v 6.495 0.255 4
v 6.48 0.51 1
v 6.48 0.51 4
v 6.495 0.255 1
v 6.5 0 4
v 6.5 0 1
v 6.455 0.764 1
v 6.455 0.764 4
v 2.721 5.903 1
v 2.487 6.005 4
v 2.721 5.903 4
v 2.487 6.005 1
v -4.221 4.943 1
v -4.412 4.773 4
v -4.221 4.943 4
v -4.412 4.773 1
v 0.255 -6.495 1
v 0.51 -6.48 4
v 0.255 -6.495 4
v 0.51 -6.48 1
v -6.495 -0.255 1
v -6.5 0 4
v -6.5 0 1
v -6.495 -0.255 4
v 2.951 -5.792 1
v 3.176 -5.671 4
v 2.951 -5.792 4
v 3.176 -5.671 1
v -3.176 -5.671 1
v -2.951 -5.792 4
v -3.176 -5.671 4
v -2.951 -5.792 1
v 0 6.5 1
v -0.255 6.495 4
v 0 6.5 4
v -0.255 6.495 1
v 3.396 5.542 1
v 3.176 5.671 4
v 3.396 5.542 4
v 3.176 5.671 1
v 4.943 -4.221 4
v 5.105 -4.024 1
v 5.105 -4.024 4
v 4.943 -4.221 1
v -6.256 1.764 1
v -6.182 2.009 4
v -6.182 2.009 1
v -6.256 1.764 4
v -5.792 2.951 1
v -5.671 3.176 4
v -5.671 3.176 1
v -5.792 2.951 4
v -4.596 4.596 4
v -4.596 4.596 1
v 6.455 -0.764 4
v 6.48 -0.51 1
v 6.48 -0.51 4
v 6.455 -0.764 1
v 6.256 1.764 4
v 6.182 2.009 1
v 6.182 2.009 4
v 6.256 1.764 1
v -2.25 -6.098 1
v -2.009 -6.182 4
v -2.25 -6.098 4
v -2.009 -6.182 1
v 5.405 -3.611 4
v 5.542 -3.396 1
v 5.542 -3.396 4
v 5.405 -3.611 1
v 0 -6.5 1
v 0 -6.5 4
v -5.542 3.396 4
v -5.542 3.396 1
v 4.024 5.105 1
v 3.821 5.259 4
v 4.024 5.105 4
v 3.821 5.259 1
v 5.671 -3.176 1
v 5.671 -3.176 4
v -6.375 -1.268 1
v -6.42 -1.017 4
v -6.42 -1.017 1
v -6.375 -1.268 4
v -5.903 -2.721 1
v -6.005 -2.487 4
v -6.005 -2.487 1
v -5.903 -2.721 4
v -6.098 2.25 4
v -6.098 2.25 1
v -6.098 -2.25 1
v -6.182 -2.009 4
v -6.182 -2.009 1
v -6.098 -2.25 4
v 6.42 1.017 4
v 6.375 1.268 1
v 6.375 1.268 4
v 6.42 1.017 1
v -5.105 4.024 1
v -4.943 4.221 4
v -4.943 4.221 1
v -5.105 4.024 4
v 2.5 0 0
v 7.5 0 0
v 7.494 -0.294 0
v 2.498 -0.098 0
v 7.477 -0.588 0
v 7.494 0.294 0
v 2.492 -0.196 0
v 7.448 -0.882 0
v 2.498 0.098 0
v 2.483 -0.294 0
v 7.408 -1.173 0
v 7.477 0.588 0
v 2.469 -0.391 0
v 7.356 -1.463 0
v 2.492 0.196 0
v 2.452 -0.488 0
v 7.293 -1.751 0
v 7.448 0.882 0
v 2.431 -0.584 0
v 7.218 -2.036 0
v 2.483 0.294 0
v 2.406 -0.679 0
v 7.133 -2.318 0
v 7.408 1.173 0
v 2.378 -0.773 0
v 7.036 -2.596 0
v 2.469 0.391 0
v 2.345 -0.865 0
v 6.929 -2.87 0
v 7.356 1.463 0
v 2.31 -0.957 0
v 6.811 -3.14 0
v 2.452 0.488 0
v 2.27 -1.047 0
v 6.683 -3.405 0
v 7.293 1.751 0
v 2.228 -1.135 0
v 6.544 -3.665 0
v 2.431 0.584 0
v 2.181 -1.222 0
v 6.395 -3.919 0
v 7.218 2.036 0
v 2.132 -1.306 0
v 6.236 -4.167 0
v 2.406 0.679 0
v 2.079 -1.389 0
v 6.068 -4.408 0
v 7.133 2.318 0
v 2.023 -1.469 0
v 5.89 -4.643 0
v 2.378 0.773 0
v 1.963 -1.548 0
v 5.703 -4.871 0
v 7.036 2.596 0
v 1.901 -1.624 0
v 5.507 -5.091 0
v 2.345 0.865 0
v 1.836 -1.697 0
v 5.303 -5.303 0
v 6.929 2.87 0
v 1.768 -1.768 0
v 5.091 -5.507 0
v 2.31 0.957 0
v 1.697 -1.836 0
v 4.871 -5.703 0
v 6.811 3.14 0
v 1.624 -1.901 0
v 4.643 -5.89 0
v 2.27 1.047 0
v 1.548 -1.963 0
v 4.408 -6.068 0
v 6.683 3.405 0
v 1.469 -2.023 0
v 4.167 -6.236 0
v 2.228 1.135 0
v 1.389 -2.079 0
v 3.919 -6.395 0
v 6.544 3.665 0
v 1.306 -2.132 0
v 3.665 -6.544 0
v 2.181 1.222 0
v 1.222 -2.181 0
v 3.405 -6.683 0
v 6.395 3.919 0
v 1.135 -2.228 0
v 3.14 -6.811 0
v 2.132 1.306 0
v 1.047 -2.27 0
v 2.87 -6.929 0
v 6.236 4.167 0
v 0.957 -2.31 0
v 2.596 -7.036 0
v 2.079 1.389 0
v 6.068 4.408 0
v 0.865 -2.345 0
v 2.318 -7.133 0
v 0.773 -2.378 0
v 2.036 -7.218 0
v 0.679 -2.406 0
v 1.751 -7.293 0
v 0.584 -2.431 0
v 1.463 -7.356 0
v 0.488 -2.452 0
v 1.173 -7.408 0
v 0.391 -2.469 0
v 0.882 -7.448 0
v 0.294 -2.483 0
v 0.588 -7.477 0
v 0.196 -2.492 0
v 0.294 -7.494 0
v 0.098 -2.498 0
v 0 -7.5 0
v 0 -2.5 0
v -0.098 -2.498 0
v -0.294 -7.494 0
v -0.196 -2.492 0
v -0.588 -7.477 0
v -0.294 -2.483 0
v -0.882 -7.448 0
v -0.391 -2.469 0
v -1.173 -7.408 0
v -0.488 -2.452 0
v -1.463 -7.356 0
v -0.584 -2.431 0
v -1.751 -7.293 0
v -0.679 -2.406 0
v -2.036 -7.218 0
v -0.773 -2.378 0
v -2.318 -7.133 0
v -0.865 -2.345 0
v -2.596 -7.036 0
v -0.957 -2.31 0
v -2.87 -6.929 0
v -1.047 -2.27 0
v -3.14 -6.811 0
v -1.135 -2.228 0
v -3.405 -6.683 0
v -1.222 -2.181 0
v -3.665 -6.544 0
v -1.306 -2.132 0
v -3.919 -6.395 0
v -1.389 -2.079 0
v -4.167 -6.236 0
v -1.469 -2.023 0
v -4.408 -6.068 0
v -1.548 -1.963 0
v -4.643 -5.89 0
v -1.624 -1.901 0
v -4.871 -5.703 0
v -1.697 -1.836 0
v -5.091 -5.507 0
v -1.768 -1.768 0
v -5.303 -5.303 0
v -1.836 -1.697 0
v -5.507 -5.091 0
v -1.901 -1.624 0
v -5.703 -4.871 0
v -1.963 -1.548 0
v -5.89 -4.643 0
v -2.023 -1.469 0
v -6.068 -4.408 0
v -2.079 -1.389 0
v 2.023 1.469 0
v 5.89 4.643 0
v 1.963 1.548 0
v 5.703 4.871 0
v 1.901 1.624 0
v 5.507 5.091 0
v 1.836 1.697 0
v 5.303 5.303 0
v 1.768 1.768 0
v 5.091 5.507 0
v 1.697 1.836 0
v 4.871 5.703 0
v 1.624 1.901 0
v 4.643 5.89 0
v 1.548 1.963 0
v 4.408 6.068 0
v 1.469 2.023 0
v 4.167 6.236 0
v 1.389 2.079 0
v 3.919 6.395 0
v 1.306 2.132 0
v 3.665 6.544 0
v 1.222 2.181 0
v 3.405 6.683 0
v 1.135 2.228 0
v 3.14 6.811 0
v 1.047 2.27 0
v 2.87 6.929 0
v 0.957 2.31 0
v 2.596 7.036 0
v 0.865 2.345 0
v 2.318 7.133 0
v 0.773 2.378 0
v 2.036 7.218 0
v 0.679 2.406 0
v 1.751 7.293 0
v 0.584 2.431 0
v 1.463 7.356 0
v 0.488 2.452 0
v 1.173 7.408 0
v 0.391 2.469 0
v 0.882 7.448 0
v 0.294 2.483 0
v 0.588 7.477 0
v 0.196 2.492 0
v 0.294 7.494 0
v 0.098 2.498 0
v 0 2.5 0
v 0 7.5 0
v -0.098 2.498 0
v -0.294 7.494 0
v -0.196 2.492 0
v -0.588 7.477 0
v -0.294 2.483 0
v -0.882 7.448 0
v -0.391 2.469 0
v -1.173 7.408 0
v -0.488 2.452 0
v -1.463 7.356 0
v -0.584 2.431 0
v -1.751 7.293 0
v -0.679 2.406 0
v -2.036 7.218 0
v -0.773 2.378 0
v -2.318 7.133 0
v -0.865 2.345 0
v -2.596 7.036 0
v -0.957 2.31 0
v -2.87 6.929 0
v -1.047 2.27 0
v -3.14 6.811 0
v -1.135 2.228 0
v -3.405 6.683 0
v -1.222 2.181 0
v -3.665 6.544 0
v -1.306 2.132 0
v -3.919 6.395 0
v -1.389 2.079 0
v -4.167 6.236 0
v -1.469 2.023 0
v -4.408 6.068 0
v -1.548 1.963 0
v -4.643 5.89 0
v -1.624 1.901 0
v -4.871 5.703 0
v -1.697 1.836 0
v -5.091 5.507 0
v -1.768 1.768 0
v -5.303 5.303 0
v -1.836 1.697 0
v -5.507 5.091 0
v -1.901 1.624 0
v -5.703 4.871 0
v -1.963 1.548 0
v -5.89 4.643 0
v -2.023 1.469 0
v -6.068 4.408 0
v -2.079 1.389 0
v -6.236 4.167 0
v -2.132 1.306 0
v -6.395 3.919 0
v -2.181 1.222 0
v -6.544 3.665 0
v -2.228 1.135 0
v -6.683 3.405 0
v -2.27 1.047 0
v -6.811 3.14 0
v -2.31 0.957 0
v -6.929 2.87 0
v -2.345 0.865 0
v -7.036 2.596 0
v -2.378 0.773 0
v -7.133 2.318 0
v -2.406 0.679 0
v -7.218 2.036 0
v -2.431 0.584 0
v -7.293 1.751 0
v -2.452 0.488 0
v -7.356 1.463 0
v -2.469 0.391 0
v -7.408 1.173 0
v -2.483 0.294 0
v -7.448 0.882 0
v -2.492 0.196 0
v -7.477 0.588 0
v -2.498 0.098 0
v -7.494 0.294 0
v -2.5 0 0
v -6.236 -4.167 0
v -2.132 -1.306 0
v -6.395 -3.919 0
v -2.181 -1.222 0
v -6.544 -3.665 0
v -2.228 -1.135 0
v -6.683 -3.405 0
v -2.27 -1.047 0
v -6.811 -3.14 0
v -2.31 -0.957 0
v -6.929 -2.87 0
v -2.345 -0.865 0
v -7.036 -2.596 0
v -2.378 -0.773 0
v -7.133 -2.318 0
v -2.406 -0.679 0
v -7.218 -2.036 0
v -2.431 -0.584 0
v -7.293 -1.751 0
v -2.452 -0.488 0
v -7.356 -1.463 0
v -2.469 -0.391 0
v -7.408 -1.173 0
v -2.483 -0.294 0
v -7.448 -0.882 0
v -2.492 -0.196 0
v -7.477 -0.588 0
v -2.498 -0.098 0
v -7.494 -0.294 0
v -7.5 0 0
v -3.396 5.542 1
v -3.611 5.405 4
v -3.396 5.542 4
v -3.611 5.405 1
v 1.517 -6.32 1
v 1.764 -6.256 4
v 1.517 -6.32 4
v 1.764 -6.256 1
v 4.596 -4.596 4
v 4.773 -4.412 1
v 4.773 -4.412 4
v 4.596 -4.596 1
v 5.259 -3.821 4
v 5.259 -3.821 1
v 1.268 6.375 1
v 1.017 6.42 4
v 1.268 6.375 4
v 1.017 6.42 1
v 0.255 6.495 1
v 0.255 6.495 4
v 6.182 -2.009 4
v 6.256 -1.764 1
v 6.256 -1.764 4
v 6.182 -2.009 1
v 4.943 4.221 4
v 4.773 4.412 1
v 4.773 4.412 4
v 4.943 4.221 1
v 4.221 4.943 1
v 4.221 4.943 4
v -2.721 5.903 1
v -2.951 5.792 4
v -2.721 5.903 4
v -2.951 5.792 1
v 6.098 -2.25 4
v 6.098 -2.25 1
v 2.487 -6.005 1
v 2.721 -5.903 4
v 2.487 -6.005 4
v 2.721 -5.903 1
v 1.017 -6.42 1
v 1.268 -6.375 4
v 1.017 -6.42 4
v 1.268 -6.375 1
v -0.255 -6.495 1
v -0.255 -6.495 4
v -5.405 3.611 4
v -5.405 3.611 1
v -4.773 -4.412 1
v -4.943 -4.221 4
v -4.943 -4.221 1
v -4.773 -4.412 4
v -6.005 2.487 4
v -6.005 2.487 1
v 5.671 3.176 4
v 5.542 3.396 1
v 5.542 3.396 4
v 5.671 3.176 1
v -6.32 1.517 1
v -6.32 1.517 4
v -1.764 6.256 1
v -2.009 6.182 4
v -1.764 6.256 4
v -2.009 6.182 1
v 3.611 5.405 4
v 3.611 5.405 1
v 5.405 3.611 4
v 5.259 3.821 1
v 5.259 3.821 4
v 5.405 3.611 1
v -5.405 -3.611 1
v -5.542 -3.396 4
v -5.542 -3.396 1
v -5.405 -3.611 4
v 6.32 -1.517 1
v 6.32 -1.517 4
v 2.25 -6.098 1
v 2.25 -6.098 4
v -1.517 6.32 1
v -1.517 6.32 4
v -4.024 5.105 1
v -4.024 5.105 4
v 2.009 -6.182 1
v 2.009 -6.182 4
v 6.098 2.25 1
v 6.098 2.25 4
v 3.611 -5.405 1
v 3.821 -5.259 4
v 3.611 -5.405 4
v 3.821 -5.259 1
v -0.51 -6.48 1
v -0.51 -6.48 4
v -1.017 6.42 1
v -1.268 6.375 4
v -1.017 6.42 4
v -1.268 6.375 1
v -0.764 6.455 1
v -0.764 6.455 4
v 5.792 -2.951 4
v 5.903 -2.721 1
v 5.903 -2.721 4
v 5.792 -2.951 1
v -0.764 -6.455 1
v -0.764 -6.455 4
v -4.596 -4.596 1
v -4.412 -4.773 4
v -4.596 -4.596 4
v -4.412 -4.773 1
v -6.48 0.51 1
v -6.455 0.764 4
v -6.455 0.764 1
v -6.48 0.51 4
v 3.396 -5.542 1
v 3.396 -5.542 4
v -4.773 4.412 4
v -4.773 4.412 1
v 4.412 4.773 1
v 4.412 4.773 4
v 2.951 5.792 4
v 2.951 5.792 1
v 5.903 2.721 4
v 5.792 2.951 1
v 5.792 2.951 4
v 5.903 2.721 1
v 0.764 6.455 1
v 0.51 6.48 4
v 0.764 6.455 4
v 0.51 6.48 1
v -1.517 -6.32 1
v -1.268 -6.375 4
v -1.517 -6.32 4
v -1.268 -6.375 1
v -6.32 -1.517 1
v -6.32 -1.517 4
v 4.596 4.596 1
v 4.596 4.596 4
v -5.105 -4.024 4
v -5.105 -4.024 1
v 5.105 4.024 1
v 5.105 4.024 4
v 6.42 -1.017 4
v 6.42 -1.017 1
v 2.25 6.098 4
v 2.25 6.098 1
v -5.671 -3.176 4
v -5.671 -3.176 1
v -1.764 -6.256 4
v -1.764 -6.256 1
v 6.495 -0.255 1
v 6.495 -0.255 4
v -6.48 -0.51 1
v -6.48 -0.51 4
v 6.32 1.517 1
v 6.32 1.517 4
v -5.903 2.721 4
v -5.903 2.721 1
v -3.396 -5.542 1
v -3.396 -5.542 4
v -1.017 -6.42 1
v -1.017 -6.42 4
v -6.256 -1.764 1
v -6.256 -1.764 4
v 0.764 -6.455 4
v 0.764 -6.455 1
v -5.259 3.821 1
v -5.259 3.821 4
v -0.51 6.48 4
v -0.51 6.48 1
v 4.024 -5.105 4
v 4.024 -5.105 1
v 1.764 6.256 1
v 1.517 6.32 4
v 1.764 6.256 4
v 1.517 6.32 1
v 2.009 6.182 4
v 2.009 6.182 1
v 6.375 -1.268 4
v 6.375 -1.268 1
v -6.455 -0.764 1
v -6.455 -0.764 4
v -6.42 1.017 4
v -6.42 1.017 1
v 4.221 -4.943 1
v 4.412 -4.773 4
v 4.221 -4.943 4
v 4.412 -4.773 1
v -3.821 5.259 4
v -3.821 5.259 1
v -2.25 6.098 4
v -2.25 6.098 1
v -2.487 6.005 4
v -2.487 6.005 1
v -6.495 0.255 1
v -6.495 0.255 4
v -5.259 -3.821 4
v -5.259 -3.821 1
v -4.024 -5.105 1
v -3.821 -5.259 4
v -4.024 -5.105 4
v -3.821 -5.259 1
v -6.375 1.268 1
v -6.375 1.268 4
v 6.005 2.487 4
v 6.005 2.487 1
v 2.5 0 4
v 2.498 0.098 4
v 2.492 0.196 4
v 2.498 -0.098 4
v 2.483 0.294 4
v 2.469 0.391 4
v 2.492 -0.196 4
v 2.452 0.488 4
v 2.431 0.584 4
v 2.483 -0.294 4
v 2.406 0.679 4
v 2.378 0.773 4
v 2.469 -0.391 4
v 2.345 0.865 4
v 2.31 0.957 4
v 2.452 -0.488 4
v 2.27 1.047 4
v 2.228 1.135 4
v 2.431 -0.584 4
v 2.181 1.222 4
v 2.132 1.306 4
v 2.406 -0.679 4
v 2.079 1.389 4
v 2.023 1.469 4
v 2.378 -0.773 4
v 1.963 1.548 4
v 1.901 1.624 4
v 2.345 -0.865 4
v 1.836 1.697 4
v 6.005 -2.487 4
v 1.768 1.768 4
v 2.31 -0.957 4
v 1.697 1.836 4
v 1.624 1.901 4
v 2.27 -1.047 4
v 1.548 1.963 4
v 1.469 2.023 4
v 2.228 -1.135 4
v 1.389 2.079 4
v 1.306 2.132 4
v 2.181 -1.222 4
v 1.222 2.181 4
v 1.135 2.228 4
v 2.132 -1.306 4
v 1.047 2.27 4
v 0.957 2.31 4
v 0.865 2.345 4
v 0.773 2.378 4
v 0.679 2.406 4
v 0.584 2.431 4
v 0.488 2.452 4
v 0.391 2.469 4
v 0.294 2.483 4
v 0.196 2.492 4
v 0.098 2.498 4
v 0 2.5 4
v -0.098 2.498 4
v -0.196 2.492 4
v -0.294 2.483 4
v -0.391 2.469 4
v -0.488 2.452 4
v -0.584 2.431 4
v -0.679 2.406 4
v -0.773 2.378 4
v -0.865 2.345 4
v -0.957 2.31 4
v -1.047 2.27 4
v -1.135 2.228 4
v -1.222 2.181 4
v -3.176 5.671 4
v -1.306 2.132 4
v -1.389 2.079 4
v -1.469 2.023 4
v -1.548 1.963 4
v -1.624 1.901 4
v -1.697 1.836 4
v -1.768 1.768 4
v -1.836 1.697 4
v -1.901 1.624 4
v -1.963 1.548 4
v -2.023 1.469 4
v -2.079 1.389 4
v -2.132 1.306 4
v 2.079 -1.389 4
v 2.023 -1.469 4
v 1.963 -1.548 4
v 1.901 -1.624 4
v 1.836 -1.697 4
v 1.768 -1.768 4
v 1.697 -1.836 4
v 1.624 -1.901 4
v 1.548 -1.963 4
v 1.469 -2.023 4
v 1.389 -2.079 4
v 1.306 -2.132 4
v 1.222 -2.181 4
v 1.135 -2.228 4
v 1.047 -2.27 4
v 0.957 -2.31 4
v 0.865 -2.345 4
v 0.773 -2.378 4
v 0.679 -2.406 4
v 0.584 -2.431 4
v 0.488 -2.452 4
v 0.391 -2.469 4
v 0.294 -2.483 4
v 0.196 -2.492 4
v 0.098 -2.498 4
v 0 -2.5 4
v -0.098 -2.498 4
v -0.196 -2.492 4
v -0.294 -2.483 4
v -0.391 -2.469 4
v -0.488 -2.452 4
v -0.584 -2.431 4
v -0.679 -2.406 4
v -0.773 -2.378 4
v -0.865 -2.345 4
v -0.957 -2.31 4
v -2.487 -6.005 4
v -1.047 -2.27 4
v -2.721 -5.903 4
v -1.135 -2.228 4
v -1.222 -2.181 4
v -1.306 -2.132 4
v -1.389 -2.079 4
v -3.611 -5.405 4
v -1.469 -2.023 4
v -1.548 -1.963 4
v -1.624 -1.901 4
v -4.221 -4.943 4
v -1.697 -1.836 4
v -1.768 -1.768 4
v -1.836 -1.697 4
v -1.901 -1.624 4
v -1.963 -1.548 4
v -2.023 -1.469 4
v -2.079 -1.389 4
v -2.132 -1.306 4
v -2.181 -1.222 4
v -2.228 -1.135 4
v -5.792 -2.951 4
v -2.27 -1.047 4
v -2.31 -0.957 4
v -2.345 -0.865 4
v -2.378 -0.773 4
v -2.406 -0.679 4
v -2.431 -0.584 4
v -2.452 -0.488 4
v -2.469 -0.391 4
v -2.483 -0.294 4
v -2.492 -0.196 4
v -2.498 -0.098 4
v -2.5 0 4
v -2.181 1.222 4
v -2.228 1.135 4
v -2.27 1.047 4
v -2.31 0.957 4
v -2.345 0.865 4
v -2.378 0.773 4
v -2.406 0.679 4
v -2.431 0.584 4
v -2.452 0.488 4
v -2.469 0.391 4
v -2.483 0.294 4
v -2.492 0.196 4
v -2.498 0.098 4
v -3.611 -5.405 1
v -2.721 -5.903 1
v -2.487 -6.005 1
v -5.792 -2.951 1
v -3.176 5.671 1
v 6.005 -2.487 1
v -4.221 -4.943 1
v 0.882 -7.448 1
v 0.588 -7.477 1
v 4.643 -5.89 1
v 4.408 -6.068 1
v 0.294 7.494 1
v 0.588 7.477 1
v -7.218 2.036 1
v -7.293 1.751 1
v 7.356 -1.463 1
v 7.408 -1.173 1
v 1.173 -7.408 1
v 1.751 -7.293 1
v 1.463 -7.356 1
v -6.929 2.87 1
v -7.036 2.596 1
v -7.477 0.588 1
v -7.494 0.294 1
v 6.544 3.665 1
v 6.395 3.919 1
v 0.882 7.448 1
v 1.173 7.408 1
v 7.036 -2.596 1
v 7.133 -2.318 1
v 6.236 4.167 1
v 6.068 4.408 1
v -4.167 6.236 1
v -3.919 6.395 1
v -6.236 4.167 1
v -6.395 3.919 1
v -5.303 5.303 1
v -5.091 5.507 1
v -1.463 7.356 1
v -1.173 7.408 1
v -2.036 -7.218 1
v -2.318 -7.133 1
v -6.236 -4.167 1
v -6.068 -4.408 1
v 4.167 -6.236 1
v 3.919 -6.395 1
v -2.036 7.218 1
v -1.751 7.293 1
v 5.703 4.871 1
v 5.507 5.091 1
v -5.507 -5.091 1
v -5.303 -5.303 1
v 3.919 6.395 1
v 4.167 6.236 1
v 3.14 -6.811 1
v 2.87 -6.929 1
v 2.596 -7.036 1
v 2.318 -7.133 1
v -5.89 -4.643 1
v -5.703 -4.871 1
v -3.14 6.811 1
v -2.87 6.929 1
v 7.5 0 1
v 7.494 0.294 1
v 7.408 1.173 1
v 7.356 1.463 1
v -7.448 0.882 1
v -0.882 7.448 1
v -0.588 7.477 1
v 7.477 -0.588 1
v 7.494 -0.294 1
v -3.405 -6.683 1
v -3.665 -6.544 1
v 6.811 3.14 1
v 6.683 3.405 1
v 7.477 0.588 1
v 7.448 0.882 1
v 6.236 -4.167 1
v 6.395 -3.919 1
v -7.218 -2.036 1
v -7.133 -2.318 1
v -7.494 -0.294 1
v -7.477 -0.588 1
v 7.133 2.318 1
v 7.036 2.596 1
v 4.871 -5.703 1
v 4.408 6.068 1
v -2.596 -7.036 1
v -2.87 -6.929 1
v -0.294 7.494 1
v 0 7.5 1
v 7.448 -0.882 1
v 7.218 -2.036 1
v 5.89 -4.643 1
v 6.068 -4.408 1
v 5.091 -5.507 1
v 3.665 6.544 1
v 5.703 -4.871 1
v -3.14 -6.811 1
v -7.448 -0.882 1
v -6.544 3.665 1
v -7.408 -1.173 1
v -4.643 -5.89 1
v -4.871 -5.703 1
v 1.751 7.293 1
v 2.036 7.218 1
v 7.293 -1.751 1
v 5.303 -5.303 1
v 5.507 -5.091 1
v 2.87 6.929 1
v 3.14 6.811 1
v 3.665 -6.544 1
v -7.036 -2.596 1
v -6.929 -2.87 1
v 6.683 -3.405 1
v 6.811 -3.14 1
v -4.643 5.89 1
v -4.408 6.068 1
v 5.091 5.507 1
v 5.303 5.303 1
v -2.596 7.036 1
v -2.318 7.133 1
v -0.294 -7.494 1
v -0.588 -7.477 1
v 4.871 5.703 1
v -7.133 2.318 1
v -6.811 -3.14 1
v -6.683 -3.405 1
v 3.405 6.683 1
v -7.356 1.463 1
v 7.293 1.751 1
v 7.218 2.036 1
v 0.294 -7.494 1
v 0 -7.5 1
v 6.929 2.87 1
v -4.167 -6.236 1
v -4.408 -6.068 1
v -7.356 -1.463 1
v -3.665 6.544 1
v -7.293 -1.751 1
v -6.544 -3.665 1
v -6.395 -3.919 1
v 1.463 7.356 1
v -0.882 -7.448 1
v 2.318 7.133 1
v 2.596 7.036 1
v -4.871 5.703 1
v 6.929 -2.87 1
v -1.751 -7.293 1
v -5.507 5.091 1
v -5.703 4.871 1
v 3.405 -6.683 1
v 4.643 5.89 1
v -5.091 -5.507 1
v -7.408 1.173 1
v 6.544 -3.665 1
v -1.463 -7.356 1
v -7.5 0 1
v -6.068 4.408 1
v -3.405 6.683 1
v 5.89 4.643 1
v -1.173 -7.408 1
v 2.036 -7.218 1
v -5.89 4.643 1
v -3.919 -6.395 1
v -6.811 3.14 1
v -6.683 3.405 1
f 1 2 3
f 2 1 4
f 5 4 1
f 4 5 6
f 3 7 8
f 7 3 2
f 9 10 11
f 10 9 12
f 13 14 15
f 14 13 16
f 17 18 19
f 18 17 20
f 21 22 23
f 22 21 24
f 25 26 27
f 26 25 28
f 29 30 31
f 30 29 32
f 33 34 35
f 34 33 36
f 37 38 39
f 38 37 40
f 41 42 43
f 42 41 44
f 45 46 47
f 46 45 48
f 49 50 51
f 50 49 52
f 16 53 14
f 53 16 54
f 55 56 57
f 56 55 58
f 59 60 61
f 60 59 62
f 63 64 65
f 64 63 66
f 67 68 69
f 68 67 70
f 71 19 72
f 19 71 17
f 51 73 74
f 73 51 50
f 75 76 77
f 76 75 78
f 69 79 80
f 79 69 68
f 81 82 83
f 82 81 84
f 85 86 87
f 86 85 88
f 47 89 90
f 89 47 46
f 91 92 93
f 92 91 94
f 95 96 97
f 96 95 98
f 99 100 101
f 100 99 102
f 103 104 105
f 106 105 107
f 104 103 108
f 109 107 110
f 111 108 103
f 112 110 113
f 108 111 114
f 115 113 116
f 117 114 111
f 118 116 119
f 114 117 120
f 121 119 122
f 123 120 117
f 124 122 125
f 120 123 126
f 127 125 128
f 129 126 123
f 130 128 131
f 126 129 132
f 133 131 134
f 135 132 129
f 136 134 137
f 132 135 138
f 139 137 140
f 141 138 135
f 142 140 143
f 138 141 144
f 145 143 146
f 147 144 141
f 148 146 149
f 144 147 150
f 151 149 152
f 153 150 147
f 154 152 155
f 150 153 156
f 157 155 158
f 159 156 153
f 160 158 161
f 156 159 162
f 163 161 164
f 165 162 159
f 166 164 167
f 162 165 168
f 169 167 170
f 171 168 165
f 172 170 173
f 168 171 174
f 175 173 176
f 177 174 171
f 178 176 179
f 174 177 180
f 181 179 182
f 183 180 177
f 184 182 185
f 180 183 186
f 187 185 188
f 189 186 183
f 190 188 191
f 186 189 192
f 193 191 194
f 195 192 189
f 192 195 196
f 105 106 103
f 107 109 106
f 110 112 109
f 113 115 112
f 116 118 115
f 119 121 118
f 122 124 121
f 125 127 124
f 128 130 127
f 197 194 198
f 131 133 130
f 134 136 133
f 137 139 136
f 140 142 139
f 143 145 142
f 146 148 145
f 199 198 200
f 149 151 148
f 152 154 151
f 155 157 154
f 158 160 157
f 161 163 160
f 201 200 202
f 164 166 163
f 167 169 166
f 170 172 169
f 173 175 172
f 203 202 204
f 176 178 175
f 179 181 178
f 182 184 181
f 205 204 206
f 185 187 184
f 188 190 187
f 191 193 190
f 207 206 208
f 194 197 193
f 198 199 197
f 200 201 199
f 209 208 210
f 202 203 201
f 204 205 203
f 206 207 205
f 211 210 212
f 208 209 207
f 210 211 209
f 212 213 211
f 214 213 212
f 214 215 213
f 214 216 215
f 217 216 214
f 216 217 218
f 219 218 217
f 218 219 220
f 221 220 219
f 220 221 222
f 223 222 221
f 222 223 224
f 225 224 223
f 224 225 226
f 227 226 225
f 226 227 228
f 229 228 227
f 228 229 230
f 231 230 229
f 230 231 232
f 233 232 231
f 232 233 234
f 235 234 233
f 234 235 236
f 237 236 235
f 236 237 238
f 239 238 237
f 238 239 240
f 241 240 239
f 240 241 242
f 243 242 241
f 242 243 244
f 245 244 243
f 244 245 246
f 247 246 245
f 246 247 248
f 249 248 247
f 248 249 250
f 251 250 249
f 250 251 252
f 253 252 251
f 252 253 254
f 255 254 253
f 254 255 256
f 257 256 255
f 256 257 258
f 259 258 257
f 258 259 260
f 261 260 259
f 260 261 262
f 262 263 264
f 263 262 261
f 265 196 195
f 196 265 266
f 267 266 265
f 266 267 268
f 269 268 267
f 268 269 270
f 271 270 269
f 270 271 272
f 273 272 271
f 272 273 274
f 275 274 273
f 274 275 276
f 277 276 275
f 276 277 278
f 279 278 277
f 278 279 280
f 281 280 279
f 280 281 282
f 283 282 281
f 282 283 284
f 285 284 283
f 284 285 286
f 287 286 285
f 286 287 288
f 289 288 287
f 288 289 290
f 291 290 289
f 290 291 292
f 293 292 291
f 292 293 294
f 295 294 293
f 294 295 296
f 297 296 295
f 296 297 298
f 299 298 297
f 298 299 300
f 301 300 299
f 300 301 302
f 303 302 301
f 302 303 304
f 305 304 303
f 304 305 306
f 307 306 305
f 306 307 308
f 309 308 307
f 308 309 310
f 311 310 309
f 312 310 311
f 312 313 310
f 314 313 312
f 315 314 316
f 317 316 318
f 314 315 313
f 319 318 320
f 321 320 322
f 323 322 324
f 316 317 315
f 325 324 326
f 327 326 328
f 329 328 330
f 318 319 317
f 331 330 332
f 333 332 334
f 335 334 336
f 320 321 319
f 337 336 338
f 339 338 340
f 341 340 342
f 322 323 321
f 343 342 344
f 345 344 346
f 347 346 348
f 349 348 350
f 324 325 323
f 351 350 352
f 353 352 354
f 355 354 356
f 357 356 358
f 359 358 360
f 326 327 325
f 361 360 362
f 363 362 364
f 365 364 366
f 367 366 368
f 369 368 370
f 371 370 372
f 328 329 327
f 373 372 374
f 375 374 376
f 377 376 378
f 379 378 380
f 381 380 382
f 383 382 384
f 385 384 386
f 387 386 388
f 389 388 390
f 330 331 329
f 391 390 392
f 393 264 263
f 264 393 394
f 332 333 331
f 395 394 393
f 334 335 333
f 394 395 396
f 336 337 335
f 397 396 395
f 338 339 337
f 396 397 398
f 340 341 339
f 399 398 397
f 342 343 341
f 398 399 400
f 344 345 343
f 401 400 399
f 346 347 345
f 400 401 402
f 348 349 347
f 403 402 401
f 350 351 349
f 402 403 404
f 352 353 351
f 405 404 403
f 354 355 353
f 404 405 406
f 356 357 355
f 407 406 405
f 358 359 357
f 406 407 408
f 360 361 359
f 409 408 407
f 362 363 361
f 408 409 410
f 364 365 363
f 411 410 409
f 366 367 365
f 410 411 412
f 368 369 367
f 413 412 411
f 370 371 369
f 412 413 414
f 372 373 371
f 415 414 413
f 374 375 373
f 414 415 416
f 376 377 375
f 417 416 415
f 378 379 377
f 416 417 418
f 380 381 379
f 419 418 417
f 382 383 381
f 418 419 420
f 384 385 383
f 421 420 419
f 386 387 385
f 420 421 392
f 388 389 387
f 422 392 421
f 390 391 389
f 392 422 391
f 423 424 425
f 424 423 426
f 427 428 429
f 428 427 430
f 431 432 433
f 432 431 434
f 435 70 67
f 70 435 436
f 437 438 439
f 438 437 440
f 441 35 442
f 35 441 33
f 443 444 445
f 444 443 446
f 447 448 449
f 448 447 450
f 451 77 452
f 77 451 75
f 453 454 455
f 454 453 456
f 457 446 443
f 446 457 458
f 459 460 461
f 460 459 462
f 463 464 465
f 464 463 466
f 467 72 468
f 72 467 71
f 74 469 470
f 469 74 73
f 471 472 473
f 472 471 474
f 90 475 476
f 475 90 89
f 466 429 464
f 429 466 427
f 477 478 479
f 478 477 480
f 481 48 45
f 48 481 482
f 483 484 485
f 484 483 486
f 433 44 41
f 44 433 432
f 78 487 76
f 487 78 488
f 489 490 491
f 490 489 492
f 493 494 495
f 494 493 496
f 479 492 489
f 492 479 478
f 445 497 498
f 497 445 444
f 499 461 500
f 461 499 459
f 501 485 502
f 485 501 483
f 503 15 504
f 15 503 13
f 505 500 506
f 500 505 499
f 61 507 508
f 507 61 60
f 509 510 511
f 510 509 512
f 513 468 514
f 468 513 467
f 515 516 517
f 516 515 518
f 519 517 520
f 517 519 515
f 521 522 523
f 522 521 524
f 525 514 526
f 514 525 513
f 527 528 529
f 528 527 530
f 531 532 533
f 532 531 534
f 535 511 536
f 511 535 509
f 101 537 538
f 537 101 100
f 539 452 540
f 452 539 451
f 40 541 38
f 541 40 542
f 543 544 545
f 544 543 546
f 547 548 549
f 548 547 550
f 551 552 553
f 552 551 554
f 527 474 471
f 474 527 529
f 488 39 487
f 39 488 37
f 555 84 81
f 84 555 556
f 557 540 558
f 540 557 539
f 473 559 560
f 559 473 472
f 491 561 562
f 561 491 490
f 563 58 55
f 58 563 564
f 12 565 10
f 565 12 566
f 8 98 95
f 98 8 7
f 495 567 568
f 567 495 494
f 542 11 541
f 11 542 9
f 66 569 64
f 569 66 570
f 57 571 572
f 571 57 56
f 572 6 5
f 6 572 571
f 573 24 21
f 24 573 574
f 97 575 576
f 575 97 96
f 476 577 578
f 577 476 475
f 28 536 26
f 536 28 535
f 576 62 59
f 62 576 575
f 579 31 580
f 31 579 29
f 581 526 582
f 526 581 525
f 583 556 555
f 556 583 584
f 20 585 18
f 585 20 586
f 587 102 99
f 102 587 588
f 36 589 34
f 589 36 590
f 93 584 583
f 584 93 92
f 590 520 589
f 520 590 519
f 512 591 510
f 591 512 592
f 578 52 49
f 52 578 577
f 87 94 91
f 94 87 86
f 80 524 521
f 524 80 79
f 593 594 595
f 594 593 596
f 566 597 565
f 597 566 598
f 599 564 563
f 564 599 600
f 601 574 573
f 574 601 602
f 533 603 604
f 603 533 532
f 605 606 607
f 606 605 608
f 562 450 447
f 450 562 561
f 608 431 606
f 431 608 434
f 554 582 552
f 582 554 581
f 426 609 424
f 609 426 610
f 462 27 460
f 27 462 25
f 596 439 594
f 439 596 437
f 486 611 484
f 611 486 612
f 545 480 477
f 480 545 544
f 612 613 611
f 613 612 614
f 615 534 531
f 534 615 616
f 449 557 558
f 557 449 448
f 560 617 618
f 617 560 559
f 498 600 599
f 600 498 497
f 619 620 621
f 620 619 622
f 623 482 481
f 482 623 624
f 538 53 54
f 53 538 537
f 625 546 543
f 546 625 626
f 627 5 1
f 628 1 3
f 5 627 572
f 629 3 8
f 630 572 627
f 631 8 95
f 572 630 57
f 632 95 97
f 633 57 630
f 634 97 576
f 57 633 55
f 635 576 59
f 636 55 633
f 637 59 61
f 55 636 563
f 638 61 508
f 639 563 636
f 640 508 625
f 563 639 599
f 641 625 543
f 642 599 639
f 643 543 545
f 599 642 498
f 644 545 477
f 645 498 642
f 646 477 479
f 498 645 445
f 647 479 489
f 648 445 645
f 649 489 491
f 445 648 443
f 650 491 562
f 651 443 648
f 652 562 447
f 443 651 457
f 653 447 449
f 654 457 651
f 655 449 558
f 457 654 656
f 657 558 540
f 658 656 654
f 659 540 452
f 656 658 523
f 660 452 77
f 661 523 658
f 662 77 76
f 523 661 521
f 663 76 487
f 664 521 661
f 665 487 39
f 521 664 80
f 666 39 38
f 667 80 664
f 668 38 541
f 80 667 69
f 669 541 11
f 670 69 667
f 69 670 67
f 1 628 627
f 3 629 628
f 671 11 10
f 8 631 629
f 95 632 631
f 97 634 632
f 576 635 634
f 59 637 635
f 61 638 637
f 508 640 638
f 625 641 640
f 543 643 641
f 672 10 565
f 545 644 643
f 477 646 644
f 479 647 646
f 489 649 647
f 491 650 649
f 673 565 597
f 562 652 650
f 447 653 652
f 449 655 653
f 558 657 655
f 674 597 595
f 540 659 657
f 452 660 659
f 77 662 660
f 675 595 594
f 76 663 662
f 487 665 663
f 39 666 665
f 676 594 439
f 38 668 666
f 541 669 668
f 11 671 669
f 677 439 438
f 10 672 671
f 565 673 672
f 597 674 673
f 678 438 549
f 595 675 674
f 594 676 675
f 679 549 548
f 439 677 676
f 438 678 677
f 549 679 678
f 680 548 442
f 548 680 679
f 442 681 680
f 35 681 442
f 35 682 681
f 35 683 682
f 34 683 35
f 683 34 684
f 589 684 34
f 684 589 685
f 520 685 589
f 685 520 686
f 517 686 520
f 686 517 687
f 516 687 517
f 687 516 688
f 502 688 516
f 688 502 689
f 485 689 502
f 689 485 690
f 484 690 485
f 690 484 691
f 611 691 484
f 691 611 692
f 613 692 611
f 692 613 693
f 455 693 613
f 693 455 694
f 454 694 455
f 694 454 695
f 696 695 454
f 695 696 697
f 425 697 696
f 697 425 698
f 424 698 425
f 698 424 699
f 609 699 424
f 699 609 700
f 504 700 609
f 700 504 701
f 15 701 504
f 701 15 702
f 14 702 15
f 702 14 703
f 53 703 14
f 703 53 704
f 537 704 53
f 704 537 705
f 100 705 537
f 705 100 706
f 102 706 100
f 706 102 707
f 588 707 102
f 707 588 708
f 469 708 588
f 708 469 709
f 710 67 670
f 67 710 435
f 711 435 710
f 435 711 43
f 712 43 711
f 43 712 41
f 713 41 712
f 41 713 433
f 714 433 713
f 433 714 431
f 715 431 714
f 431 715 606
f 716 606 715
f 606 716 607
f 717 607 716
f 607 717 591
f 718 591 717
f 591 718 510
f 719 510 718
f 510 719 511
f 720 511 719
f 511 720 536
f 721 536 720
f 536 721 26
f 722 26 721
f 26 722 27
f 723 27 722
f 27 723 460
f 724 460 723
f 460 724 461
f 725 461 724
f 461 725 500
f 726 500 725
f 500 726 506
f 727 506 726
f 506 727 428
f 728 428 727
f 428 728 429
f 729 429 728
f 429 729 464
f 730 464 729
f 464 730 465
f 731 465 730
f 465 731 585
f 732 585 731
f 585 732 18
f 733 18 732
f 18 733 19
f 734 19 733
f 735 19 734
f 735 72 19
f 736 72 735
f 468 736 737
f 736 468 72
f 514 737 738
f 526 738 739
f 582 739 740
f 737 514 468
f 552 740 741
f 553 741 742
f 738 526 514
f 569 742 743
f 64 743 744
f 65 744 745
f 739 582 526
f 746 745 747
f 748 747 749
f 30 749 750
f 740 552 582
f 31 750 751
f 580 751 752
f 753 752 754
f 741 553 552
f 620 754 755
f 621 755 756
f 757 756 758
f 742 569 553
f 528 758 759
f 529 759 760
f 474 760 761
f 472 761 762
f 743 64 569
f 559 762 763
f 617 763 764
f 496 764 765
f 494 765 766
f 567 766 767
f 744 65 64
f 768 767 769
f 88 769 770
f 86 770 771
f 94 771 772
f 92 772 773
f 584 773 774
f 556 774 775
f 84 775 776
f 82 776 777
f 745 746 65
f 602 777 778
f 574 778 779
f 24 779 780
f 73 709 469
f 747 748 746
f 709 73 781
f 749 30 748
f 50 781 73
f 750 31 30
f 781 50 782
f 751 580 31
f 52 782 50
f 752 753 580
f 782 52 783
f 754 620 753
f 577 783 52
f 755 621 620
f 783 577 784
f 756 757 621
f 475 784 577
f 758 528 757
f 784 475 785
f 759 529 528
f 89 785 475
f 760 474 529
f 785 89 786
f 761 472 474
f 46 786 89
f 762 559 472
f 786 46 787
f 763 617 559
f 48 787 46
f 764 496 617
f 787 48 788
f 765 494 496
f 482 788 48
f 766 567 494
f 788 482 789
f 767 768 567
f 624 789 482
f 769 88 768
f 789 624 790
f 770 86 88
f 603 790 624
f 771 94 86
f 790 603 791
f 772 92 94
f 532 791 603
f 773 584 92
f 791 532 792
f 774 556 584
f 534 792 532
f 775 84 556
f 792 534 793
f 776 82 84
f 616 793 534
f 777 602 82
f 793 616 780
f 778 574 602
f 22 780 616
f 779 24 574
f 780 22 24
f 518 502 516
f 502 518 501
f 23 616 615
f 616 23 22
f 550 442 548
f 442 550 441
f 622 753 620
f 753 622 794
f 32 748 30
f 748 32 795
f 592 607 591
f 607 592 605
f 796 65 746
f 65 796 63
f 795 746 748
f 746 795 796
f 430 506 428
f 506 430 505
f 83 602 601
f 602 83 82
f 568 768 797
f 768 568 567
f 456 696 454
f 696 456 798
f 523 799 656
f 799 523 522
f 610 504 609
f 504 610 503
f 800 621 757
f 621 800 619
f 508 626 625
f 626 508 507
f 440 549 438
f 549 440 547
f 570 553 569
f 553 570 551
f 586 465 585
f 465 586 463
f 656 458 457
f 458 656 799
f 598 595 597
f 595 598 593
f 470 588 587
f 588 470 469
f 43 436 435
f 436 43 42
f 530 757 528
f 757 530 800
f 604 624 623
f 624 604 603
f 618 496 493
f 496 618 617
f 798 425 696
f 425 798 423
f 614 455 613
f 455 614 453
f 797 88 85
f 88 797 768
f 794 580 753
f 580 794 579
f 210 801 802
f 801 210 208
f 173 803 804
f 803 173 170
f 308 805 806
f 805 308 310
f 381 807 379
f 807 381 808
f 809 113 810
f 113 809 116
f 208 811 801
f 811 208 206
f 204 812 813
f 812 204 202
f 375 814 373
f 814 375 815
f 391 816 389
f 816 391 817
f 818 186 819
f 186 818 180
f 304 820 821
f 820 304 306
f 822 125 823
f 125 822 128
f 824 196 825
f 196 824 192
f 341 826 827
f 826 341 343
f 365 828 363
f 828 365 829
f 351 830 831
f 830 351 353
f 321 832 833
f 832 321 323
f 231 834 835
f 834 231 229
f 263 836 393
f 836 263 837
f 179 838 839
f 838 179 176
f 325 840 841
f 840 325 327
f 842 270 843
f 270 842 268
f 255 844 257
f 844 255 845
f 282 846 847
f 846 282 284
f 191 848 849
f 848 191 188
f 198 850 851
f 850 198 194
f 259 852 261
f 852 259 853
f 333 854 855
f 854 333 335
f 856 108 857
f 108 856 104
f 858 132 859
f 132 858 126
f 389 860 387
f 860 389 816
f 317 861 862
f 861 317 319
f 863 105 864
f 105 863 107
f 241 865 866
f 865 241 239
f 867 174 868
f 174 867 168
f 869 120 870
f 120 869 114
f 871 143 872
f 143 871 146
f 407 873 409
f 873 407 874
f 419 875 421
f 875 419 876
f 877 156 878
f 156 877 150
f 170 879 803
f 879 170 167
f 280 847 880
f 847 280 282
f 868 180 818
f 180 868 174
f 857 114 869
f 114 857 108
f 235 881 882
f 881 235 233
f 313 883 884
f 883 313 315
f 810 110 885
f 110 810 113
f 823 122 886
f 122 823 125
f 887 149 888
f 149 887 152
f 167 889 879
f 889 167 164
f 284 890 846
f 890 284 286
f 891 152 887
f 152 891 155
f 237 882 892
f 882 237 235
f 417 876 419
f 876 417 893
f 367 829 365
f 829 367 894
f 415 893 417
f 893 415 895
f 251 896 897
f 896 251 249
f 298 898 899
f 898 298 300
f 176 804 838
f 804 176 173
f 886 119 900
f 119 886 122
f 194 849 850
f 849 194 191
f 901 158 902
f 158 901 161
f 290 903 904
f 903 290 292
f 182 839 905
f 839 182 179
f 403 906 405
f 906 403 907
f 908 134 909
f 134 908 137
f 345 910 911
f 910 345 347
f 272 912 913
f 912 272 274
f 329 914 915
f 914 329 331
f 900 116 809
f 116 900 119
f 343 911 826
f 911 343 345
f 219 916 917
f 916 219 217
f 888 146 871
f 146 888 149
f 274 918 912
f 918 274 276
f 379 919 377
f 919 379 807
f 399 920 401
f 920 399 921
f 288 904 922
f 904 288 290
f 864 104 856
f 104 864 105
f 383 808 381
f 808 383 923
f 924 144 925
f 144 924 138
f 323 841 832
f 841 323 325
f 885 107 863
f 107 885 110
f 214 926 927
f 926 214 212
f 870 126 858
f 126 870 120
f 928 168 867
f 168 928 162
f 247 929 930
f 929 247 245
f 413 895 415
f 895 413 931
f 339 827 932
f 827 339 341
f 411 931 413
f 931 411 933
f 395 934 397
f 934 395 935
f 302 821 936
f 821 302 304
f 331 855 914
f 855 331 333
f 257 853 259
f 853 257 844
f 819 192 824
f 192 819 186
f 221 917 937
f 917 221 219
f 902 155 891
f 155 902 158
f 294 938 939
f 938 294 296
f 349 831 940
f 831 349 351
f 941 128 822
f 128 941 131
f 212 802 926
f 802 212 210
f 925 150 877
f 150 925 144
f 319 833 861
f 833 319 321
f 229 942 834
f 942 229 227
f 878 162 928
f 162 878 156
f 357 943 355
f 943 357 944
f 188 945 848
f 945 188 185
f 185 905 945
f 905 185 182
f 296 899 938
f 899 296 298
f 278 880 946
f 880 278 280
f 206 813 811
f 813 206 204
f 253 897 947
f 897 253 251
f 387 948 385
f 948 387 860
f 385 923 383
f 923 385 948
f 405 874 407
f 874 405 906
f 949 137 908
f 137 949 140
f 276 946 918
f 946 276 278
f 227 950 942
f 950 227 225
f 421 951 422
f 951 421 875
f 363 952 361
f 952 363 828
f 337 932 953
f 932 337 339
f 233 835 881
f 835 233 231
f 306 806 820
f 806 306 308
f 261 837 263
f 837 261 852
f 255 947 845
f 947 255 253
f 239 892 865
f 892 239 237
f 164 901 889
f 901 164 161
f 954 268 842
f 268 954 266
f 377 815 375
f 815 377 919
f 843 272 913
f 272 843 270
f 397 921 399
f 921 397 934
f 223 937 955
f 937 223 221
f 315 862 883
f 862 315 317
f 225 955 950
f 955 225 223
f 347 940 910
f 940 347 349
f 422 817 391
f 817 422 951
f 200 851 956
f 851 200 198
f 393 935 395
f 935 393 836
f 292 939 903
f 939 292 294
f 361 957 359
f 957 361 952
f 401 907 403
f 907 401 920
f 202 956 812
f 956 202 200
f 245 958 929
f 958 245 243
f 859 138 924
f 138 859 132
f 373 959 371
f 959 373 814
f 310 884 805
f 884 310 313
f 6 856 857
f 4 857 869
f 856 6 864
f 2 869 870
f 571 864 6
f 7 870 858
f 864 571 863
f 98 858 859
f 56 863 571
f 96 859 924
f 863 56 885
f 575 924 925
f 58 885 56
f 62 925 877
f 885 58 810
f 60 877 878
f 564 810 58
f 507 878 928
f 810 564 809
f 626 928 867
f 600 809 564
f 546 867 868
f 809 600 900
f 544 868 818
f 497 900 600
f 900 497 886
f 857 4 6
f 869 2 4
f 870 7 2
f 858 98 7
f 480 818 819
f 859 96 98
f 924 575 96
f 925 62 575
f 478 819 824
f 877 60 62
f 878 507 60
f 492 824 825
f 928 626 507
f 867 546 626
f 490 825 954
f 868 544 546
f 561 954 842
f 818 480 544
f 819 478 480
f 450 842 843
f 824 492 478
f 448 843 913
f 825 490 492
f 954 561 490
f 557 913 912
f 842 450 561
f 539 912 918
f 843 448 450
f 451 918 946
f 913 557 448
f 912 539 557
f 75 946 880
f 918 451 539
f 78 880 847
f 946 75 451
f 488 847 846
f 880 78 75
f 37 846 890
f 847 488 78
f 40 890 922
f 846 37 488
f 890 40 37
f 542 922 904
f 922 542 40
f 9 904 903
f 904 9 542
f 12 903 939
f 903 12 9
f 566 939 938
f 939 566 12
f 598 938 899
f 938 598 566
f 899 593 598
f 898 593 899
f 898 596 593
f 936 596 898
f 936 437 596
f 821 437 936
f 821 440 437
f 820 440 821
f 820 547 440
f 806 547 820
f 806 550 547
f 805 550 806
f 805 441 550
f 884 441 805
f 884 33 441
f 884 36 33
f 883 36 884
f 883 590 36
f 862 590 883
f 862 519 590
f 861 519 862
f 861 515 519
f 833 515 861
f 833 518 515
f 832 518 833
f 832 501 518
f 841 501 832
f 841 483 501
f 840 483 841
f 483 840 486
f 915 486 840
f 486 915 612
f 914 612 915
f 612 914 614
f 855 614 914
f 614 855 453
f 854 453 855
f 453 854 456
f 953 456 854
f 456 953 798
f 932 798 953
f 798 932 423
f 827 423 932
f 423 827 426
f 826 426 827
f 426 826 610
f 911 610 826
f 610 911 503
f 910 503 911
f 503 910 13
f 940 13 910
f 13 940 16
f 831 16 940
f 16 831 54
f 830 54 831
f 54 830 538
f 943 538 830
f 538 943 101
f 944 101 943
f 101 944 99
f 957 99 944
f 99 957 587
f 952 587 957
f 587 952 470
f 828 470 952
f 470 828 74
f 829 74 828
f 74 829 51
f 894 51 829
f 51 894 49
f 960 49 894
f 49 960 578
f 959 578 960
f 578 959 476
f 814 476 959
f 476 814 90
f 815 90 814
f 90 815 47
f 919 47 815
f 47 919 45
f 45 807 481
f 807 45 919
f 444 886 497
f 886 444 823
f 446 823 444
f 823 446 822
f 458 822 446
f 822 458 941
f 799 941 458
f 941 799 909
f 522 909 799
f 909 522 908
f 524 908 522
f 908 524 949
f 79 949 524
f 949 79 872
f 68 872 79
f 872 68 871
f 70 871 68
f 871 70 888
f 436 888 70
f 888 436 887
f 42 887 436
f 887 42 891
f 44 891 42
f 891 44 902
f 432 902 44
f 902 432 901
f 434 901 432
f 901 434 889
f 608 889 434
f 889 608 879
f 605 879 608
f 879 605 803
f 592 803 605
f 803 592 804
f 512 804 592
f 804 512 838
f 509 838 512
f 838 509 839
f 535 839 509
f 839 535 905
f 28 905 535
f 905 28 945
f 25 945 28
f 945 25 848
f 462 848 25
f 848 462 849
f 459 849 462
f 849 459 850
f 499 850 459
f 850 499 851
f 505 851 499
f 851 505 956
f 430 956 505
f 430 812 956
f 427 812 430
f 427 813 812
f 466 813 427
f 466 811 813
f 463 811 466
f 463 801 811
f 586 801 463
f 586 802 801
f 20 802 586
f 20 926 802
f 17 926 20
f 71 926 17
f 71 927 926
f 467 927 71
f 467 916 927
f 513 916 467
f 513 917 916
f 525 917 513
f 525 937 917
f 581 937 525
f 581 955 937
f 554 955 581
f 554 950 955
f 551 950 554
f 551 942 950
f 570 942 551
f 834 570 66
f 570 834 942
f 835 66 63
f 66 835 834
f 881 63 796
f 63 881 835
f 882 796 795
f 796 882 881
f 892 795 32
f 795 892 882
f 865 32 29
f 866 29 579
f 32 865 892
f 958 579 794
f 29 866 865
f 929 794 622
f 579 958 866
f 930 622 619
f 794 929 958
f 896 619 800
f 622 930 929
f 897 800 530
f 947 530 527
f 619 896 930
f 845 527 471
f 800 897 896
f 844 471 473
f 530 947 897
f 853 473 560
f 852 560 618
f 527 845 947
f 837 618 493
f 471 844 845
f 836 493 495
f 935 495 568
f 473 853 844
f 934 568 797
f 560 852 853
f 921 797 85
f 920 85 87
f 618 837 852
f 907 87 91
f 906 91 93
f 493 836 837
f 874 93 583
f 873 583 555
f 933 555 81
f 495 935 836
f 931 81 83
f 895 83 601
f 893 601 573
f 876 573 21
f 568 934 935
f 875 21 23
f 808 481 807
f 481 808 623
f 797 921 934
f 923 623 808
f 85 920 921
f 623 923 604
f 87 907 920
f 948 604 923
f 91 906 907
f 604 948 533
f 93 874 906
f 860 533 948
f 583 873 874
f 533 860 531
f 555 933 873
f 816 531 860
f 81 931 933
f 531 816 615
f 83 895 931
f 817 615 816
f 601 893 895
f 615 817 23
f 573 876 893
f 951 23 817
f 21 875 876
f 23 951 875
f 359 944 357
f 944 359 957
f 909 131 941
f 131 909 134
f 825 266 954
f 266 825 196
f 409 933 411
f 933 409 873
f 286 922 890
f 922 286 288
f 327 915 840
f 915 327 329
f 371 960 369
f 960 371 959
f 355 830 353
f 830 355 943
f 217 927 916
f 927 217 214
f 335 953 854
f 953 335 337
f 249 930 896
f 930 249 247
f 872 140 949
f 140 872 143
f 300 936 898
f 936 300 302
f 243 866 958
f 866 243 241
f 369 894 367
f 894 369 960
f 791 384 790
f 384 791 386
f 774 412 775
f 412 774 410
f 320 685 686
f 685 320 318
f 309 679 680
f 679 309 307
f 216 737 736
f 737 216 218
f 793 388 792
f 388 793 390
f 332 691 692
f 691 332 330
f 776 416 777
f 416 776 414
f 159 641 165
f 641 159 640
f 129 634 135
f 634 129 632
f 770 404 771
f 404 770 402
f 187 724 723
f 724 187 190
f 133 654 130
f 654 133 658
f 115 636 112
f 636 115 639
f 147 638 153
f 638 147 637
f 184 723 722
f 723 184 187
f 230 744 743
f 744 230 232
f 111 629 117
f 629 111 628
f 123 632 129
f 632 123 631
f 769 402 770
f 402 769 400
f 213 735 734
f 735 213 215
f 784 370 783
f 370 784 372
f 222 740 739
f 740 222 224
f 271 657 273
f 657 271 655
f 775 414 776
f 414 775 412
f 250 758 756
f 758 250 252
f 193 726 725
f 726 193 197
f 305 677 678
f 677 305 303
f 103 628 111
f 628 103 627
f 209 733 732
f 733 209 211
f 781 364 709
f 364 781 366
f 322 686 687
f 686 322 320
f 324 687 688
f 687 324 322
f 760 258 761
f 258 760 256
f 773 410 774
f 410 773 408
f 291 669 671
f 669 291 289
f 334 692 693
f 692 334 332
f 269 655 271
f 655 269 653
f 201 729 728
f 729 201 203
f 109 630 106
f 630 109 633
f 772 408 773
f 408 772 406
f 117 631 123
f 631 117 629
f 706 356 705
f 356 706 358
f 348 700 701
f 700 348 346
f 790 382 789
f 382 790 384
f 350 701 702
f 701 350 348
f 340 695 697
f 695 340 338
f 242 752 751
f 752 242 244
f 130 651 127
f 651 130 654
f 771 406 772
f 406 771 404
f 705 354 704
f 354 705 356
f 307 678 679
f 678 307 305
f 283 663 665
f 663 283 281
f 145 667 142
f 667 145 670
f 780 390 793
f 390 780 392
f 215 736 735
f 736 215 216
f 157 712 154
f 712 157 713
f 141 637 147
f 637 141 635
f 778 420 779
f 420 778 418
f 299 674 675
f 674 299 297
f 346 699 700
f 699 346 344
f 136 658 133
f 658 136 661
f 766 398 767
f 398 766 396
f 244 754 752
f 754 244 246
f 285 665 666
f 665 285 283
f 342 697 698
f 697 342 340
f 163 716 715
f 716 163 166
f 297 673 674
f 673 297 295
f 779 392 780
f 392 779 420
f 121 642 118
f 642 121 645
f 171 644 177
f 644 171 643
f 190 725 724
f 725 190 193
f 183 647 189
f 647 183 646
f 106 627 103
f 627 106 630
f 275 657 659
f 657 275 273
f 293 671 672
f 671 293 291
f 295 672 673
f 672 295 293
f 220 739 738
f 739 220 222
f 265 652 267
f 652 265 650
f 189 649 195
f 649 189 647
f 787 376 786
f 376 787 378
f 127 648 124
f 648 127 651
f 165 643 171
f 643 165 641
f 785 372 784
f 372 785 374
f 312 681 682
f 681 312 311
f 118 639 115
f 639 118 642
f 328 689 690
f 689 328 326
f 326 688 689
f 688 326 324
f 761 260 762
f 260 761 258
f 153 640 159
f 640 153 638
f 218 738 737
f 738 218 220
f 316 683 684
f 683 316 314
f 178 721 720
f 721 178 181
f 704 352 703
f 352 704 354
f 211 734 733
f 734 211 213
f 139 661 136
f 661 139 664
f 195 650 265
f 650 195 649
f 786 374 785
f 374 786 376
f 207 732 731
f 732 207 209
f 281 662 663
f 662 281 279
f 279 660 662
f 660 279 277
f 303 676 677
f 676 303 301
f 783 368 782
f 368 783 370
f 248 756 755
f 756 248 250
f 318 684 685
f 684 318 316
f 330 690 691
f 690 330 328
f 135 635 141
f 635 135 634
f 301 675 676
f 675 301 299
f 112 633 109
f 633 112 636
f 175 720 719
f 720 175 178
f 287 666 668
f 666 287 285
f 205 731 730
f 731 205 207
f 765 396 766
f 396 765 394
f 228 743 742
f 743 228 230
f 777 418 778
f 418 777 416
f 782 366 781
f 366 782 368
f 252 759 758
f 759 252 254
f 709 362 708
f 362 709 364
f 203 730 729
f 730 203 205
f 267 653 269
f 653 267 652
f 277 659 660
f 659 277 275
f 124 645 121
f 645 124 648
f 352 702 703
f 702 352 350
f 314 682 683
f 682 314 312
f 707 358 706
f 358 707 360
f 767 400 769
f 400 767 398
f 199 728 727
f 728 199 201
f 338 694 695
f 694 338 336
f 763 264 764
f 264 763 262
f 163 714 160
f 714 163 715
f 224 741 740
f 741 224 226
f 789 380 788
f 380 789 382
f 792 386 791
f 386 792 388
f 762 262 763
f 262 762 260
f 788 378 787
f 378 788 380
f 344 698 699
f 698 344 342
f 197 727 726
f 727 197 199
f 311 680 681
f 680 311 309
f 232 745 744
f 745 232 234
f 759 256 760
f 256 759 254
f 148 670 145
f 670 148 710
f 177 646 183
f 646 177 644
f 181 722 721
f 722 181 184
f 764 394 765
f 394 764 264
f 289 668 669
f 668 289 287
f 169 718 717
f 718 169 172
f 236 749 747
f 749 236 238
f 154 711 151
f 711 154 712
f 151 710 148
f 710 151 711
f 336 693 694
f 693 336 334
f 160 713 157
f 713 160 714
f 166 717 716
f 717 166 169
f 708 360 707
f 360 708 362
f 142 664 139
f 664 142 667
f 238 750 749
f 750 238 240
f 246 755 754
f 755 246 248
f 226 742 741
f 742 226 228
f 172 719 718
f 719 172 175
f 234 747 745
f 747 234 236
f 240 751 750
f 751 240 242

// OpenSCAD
$fn = 160;

module flanged_radial_ball_bearing(
    bore_d   = 5.0,
    od_d     = 13.0,
    width_h  = 4.0,
    flange_d = 15.0,
    flange_h = 1.0,
    lip_h    = 0.6,   // small step to suggest race detail
    lip_d    = 11.2   // inner step diameter (visual detail)
) {
    eps = 0.02;

    // One connected solid: outer body (with flange + race step) minus through-bore
    difference() {
        union() {
            // Main outer ring (OD 13, full width)
            cylinder(d = od_d, h = width_h, center = false);

            // Flange on one face (OD 15, thickness flange_h), connected at z=0
            cylinder(d = flange_d, h = flange_h, center = false);

            // Small race step on the opposite face to show bearing detail
            translate([0, 0, width_h - lip_h])
                cylinder(d = lip_d, h = lip_h, center = false);
        }

        // Through bore (5mm) cut all the way through with slight overcut
        translate([0, 0, -eps])
            cylinder(d = bore_d, h = width_h + 2*eps, center = false);
    }
}

flanged_radial_ball_bearing();
